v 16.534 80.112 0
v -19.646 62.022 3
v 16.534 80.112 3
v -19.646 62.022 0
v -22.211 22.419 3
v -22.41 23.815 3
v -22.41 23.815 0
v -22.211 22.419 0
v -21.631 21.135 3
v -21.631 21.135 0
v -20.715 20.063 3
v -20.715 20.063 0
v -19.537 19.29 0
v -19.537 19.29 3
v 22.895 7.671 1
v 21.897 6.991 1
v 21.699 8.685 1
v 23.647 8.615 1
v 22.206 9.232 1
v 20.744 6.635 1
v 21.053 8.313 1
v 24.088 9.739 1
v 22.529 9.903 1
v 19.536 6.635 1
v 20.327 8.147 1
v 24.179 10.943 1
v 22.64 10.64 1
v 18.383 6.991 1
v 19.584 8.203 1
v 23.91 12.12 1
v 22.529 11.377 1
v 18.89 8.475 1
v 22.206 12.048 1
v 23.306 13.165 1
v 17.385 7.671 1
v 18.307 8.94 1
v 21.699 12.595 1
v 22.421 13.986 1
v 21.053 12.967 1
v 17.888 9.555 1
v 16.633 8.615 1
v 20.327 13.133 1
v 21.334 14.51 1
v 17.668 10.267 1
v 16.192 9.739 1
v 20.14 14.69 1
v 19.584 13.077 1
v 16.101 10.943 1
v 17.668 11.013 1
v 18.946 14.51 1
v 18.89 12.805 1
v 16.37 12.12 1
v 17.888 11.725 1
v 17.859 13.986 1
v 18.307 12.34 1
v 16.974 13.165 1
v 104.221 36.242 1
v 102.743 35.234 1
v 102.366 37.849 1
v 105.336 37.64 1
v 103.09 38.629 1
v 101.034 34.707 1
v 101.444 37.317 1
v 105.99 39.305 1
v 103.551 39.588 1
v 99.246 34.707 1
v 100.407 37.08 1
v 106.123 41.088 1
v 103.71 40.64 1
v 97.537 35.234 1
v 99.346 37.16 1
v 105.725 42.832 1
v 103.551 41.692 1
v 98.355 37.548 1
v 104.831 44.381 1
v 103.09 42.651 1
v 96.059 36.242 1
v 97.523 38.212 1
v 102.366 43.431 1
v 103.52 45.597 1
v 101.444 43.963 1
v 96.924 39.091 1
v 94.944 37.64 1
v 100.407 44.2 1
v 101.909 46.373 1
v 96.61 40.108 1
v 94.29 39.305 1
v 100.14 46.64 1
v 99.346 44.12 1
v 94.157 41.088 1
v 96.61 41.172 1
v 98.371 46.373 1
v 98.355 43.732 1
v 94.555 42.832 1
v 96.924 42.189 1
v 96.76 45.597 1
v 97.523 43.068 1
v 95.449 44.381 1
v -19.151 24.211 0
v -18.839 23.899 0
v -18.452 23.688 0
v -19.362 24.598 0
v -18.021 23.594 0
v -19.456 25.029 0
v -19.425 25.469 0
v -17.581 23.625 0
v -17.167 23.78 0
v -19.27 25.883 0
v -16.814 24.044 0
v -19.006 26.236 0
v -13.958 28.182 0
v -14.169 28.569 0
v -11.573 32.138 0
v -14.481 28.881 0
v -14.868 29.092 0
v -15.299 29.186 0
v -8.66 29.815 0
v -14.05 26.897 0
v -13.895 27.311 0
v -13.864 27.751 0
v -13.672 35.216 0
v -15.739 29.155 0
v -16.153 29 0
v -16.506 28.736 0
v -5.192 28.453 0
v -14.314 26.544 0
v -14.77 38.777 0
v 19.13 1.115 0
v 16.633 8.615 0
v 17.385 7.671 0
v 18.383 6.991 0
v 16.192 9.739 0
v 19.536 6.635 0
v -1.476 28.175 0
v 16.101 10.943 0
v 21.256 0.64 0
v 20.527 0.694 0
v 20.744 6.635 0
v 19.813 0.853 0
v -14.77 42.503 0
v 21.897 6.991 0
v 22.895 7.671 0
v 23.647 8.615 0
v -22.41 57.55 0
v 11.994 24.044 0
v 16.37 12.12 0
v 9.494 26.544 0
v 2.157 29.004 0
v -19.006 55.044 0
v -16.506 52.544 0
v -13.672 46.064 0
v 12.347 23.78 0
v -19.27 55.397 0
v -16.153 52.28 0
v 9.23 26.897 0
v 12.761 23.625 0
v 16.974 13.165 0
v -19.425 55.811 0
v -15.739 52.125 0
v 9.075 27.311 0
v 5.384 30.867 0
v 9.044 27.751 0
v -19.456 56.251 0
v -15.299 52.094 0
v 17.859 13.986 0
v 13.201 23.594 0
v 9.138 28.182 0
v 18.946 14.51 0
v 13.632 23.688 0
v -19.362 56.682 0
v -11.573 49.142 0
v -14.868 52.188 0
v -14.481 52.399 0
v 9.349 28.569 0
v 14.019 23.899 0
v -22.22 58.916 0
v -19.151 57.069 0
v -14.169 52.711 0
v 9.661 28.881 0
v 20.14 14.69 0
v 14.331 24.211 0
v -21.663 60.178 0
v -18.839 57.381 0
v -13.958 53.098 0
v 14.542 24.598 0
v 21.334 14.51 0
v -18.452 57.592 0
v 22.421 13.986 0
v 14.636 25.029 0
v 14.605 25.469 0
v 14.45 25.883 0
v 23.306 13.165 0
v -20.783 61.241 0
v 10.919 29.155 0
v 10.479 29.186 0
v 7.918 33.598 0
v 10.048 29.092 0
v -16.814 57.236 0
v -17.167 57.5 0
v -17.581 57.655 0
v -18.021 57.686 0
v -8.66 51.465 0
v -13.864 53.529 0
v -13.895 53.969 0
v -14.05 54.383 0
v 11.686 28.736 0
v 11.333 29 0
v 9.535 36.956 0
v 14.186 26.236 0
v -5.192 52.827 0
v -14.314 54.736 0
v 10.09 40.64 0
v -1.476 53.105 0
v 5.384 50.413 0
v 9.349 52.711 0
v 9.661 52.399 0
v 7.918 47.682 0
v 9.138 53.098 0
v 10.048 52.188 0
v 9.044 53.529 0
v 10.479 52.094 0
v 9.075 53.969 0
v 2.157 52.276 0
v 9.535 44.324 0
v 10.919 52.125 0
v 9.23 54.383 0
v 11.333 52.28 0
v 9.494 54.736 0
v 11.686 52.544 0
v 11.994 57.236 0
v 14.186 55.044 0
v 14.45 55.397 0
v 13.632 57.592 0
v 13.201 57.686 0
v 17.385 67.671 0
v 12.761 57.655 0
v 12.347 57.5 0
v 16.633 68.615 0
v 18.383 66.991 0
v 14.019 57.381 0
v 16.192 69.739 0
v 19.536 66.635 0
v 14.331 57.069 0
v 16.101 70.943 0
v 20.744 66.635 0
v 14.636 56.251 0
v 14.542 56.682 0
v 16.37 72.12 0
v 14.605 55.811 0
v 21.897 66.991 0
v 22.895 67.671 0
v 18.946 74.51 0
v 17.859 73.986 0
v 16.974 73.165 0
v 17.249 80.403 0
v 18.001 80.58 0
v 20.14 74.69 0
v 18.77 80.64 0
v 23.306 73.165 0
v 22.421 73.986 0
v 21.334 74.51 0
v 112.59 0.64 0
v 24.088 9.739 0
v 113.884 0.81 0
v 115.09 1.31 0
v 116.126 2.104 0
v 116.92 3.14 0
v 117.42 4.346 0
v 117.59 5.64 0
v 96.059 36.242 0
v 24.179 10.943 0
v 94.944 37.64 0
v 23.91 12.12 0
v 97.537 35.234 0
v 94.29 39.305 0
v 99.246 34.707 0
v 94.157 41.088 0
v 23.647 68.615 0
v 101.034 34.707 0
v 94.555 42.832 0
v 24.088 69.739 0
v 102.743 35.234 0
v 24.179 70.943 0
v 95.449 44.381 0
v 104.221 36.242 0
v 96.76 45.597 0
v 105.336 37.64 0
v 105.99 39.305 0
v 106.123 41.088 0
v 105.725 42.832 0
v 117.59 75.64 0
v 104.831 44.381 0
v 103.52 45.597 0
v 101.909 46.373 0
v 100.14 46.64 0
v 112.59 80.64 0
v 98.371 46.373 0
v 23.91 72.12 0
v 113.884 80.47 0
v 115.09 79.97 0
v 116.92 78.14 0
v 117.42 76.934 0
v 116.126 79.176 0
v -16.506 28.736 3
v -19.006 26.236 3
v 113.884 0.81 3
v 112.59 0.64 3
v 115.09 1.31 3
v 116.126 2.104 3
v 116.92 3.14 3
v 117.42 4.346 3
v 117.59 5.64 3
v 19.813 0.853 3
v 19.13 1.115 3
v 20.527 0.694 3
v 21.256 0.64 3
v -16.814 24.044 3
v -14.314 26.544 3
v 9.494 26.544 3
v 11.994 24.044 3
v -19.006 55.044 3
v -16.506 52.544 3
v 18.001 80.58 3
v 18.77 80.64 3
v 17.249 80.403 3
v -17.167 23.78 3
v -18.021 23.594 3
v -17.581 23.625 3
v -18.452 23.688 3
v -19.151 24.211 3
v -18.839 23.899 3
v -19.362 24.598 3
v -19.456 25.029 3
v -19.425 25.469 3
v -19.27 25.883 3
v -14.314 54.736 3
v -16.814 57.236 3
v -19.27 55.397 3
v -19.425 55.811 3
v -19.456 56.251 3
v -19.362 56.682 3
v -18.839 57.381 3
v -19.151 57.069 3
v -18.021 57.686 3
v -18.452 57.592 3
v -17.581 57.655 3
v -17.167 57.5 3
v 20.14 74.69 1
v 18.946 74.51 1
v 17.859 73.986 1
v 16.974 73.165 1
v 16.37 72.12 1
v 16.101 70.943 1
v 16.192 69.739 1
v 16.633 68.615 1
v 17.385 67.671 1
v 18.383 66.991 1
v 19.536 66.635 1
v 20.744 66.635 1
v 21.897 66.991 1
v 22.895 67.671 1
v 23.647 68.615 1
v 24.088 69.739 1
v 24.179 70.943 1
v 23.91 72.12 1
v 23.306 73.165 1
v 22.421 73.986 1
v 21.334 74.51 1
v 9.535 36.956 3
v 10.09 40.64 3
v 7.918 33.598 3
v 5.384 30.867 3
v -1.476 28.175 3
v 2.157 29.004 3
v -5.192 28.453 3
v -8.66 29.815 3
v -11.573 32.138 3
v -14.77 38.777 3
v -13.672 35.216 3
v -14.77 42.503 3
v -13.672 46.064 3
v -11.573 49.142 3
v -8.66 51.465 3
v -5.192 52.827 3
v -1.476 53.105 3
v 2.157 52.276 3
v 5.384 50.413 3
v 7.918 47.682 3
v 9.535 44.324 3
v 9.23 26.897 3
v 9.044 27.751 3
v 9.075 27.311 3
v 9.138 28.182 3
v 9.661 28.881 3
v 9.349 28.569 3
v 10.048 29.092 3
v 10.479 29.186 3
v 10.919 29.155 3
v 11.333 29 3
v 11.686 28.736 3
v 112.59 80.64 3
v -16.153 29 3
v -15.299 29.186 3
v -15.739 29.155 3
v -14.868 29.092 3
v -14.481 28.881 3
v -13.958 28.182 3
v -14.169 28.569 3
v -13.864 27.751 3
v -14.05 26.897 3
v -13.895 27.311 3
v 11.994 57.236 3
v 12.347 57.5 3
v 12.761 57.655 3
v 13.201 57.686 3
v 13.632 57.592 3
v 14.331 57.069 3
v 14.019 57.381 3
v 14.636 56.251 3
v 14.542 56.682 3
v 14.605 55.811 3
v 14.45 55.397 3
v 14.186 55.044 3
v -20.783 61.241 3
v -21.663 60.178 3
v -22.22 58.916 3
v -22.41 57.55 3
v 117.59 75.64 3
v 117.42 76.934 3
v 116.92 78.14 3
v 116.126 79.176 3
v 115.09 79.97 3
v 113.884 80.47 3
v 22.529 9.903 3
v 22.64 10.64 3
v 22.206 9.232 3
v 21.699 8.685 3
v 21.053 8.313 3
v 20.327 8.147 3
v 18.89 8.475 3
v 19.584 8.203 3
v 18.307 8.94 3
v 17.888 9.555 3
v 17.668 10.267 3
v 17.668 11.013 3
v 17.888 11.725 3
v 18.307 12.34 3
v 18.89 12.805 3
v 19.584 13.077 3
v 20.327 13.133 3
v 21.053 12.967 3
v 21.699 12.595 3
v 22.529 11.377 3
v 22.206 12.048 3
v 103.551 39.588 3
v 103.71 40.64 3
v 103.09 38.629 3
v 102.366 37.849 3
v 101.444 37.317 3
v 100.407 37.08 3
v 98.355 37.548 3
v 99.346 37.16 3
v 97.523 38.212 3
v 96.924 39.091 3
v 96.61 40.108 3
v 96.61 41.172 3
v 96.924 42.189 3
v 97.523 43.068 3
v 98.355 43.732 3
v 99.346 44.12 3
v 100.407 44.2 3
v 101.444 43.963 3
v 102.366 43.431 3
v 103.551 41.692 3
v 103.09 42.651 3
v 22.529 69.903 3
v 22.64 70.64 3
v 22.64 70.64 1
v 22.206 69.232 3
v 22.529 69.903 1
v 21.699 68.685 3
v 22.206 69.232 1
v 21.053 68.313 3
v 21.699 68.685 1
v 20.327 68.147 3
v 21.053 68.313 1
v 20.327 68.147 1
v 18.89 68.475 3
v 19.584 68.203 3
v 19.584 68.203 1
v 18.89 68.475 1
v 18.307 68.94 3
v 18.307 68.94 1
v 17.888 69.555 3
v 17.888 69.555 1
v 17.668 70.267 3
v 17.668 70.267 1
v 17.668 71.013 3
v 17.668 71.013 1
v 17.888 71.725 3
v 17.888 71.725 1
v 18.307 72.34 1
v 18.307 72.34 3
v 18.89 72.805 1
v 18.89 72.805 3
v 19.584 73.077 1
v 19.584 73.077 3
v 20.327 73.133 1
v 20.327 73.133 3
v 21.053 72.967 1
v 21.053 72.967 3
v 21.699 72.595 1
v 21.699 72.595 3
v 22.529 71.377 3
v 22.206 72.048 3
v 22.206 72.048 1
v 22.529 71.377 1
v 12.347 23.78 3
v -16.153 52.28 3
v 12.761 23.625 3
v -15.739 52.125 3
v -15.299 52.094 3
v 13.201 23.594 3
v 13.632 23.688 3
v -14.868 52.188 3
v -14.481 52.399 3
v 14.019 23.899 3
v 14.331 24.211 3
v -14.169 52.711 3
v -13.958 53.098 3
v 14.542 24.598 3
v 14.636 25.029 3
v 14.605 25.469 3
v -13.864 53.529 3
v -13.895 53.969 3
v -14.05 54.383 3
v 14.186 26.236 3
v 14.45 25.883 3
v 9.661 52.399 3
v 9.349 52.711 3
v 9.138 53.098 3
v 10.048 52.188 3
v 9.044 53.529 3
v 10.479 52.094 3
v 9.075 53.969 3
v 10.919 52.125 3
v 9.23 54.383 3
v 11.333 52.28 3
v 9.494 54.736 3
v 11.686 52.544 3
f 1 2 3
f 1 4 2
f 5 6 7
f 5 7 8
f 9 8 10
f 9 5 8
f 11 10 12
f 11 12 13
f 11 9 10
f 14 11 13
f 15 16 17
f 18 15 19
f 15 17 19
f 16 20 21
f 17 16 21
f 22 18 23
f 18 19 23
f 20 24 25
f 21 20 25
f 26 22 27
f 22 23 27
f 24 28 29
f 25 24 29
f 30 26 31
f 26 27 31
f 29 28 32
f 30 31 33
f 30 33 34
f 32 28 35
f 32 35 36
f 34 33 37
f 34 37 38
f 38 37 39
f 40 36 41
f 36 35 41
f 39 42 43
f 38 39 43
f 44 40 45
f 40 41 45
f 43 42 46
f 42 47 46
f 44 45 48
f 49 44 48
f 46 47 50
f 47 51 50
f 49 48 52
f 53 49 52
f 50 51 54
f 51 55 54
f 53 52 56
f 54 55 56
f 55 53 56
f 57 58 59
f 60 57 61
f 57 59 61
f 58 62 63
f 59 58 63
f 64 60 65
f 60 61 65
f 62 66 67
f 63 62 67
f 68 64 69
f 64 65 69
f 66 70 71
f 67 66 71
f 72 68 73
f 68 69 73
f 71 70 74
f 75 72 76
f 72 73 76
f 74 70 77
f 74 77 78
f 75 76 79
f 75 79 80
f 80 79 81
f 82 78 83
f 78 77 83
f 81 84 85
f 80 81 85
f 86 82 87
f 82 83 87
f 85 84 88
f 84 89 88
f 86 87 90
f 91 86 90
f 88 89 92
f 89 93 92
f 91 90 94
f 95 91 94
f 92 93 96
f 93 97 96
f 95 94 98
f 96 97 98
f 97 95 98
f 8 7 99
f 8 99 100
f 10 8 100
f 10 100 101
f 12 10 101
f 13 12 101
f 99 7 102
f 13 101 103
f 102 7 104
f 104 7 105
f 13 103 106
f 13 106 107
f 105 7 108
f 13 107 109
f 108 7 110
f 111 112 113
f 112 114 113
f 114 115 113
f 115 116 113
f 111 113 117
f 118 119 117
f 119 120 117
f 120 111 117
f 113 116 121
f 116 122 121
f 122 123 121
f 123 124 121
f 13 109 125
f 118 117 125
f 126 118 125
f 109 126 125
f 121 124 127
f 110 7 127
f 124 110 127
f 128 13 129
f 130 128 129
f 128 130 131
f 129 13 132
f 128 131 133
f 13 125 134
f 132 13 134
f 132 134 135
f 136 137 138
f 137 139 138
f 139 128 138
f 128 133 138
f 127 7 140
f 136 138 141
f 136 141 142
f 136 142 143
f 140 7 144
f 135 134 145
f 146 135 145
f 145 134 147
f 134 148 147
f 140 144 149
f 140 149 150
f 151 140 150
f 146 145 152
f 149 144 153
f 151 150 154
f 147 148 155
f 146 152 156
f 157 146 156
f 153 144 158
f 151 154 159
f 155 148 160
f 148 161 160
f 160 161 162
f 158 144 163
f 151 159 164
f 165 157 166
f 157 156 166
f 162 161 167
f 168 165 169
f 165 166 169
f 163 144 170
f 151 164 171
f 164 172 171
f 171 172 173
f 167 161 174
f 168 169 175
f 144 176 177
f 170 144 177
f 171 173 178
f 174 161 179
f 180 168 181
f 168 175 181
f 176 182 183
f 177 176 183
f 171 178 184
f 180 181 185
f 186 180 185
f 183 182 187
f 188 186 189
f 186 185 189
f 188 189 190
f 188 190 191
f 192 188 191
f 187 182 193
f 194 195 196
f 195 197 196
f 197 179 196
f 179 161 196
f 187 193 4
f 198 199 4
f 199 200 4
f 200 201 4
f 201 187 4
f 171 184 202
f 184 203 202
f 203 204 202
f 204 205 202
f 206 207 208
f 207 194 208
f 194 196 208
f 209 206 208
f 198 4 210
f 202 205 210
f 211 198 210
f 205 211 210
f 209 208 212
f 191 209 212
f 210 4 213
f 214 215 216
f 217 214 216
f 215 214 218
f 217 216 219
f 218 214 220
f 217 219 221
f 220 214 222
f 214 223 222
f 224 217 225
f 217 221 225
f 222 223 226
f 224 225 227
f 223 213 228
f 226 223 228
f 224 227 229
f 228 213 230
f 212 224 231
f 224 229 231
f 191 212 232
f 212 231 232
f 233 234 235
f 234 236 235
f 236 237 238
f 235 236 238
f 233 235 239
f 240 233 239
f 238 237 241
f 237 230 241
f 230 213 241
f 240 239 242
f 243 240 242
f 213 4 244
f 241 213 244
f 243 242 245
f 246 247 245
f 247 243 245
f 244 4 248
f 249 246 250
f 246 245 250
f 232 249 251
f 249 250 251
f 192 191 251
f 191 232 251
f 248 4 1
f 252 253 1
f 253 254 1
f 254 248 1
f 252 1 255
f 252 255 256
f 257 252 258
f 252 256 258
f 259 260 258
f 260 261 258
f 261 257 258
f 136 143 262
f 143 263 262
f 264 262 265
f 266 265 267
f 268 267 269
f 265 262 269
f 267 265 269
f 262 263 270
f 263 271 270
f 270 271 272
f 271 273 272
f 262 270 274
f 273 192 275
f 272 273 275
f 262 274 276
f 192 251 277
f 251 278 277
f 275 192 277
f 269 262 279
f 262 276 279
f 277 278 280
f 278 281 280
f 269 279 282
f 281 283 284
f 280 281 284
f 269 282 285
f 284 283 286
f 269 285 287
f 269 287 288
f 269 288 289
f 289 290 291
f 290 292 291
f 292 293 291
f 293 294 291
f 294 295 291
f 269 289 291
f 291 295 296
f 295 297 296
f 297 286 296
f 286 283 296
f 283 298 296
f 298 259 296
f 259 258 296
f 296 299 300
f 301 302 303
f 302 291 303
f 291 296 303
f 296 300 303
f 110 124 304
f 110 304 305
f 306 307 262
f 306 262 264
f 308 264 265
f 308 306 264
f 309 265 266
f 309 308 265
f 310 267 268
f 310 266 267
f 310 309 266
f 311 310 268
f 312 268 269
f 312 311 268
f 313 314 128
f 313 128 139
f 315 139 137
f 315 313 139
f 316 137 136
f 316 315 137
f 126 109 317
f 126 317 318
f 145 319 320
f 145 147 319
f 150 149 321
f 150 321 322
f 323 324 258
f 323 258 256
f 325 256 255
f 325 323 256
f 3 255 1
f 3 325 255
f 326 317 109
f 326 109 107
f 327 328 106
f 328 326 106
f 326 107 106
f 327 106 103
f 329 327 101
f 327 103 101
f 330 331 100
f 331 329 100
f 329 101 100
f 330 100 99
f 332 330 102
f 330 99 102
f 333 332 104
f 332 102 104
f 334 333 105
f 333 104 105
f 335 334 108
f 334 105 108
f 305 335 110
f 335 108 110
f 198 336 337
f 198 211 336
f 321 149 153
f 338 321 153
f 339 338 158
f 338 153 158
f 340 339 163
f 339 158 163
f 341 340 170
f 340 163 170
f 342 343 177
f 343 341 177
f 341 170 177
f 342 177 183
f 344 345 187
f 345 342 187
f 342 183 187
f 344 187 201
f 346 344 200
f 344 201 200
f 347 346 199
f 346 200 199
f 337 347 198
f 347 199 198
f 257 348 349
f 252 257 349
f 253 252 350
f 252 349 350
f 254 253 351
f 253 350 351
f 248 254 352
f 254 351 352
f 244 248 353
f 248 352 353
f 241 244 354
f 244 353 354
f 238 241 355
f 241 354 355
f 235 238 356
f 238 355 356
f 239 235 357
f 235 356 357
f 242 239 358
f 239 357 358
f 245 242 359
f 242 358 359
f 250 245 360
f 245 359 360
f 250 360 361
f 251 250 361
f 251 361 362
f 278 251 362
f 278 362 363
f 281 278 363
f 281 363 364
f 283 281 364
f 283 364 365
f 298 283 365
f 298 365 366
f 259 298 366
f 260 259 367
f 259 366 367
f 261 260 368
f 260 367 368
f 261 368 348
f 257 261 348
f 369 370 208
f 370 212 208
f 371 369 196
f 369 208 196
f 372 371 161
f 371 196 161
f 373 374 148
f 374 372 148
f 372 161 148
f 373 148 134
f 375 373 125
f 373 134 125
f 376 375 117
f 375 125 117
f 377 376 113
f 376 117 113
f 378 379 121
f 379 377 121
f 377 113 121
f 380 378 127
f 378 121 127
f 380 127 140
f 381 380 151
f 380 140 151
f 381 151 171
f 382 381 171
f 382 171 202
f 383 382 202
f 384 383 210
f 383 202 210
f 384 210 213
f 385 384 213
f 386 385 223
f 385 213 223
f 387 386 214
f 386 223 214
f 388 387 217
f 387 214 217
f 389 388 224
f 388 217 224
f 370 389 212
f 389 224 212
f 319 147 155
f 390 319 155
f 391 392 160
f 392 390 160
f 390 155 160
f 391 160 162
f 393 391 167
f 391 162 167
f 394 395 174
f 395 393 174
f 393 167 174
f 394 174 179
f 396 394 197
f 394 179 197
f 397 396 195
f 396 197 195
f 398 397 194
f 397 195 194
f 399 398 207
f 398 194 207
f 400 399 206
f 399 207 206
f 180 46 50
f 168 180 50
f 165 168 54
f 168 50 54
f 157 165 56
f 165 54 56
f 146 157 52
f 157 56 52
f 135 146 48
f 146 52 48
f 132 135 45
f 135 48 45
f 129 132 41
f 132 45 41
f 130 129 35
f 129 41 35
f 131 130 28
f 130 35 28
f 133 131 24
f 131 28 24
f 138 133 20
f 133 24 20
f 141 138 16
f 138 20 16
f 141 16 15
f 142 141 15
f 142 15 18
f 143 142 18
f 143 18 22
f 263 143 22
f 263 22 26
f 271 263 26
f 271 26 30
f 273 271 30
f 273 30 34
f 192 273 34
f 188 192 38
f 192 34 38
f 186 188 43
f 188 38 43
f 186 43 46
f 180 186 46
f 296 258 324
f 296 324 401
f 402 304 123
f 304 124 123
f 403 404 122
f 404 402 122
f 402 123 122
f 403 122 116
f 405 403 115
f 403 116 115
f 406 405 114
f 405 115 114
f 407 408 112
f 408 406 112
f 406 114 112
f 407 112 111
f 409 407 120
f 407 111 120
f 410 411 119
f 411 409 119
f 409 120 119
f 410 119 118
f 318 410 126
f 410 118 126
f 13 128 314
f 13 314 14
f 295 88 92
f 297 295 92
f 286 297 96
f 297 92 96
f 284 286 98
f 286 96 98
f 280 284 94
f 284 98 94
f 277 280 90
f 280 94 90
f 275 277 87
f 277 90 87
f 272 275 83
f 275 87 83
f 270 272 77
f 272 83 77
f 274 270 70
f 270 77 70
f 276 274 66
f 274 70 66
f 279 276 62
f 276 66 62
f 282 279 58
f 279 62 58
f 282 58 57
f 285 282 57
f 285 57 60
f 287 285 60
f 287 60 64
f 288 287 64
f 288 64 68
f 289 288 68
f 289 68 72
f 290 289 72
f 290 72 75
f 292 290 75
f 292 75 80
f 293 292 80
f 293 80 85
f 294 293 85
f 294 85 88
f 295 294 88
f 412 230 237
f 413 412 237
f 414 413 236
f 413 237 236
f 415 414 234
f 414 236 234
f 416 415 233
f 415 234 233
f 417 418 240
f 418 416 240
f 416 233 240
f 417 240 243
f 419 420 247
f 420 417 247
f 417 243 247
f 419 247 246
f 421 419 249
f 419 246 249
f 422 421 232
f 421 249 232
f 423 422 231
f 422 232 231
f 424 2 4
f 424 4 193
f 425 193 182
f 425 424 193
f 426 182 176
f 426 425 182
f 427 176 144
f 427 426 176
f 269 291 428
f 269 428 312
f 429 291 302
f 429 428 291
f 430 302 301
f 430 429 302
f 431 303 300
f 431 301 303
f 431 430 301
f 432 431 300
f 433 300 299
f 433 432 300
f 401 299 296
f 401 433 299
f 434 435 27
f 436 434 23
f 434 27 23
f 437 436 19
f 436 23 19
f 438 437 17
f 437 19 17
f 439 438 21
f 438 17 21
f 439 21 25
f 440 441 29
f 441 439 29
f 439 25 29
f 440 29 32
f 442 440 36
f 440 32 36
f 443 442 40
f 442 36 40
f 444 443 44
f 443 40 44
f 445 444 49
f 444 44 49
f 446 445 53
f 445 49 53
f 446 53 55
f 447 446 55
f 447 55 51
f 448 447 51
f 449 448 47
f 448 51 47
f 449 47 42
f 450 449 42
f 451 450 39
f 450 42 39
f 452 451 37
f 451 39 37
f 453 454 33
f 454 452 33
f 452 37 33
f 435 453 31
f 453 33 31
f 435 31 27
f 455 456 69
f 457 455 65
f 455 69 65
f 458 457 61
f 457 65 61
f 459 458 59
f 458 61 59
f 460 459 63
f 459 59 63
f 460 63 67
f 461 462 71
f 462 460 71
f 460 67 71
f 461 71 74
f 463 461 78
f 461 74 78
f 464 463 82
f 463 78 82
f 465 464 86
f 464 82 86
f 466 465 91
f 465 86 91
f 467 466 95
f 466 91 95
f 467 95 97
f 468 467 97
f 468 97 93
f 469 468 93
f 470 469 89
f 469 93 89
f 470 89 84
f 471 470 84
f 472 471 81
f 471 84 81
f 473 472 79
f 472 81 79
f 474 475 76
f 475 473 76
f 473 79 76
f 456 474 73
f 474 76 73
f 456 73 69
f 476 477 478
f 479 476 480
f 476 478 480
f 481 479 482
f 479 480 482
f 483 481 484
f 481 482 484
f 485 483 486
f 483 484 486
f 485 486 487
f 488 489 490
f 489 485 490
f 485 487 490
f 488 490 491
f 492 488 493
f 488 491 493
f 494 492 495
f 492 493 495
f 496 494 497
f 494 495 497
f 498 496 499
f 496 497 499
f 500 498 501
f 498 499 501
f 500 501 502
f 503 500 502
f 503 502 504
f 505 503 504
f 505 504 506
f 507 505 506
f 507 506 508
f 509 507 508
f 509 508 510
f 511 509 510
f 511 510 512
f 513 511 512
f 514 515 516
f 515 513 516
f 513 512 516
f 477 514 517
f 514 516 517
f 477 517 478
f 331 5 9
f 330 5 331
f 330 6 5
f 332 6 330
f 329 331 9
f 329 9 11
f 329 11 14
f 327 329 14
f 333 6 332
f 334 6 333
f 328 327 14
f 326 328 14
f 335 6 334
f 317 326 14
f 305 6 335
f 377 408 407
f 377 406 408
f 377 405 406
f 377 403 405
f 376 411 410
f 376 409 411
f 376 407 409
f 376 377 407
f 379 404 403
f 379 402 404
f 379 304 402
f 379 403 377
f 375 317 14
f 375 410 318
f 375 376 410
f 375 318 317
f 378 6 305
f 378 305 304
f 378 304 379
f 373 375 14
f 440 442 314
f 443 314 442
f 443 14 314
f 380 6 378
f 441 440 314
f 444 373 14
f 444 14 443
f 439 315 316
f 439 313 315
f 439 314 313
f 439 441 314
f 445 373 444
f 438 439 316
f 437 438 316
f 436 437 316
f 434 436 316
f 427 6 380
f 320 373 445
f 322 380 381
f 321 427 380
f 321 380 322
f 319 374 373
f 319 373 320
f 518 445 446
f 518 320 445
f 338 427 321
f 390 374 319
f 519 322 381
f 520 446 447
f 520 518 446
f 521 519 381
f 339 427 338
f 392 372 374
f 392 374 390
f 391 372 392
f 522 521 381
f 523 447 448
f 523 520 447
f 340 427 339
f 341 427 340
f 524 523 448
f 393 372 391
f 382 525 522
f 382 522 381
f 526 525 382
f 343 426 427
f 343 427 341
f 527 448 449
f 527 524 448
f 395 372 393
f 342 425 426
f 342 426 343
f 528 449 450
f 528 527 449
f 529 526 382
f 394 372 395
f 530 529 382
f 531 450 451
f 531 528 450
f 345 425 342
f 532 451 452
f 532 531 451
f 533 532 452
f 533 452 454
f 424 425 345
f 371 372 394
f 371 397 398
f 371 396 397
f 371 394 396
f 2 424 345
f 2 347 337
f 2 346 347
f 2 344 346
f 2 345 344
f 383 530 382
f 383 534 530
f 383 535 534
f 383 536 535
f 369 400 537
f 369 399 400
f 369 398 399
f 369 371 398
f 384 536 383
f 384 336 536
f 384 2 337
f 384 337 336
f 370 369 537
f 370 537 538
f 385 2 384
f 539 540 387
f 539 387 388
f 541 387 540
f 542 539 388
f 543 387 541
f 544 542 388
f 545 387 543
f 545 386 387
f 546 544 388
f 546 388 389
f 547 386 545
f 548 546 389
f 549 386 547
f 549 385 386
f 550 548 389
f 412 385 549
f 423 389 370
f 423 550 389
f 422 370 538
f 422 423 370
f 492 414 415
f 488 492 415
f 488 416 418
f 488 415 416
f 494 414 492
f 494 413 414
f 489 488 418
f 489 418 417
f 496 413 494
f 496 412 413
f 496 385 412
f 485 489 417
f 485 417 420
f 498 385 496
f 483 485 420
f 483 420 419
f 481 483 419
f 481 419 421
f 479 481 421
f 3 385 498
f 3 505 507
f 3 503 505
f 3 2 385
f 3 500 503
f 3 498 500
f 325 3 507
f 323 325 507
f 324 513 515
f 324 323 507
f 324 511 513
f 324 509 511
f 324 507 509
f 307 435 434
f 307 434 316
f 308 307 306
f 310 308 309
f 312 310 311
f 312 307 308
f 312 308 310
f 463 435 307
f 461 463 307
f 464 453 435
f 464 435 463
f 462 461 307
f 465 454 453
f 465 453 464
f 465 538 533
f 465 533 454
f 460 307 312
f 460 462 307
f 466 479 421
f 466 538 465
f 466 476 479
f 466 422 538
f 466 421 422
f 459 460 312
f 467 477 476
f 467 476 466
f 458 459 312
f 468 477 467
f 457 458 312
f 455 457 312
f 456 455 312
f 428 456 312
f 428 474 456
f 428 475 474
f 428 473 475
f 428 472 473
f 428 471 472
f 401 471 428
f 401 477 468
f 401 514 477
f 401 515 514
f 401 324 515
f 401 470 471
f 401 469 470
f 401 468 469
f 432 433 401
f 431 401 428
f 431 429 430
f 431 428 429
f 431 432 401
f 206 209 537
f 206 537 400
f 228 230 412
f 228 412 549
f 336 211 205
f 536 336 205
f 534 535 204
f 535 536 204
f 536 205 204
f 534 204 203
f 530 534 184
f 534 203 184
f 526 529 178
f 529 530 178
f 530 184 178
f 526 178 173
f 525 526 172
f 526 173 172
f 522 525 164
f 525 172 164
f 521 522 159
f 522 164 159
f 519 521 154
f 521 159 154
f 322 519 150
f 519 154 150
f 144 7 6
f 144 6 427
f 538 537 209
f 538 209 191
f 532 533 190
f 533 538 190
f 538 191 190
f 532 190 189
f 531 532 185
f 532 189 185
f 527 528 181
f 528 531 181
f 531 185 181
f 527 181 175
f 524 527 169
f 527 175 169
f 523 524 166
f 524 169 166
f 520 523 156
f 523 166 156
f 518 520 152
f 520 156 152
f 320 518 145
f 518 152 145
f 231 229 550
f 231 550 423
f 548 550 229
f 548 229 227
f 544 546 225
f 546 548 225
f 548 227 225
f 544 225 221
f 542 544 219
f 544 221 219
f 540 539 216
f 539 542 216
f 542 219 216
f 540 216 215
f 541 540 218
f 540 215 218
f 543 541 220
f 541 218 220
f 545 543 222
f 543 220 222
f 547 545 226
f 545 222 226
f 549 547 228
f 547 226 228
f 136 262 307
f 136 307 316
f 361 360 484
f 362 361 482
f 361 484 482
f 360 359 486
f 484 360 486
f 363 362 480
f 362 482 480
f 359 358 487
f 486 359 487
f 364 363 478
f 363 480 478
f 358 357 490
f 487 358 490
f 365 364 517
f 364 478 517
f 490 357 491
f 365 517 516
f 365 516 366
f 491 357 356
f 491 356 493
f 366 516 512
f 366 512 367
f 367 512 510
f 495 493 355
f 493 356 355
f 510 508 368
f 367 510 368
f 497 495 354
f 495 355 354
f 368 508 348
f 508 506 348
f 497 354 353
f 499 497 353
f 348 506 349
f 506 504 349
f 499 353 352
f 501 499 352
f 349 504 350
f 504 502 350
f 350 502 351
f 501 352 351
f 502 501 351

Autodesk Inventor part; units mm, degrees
ref_plane "YZ Plane" through (0, 0, 0) normal (1, 0, 0) x (0, 1, 0)
ref_plane "XZ Plane" through (0, 0, 0) normal (0, 1, 0) x (-1, 0, 0)
ref_plane "XY Plane" through (0, 0, 0) normal (0, 0, 1) x (1, 0, 0)
sketch "Sketch1" plane through (0, 0, 0) normal (0, 0, 1) x (1, 0, 0)
  circle A0 centre (-2.41, 40.64) radius 12.5 projected
  line L0 (-16.506, 28.736) -> (-19.006, 26.236) projected
  arc A1 (-14.314, 26.544) -> (-16.506, 28.736) centre (-15.41, 27.64) ccw projected
  line L1 (-16.814, 24.044) -> (-14.314, 26.544) projected
  arc A2 (-19.006, 26.236) -> (-16.814, 24.044) centre (-17.91, 25.14) ccw projected
  line L2 (-19.006, 55.044) -> (-16.506, 52.544) projected
  arc A3 (-16.506, 52.544) -> (-14.314, 54.736) centre (-15.41, 53.64) ccw projected
  line L3 (-14.314, 54.736) -> (-16.814, 57.236) projected
  arc A4 (-16.814, 57.236) -> (-19.006, 55.044) centre (-17.91, 56.14) ccw projected
  line L4 (9.494, 26.544) -> (11.994, 24.044) projected
  arc A5 (11.686, 28.736) -> (9.494, 26.544) centre (10.59, 27.64) ccw projected
  line L5 (14.186, 26.236) -> (11.686, 28.736) projected
  arc A6 (11.994, 24.044) -> (14.186, 26.236) centre (13.09, 25.14) ccw projected
  line L6 (11.686, 52.544) -> (14.186, 55.044) projected
  arc A7 (9.494, 54.736) -> (11.686, 52.544) centre (10.59, 53.64) ccw projected
  line L7 (11.994, 57.236) -> (9.494, 54.736) projected
  arc A8 (14.186, 55.044) -> (11.994, 57.236) centre (13.09, 56.14) ccw projected
  circle A9 centre (20.14, 70.64) radius 2.5 projected
  circle A10 centre (20.14, 10.64) radius 2.5 projected
  circle A11 centre (100.14, 40.64) radius 3.57 projected
  line L8 (-22.41, 20.64) -> (-22.41, 60.64)
  line L9 (-22.41, 60.64) -> (17.59, 80.64)
  line L10 (17.59, 80.64) -> (117.59, 80.64)
  line L11 (117.59, 80.64) -> (117.59, 0.64)
  line L12 (117.59, 0.64) -> (20.14, 0.64)
  line L13 (20.14, 0.64) -> (-22.41, 20.64)
  point P0 (0, 0)
  dimension "d0" = 20
  dimension "d1" = 0
  dimension "d2" = 80
  dimension "d3" = 90
  dimension "d4" = 90
  dimension "d5" = 10
  dimension "d6" = 100
  dimension "d7" = 140
  dimension "d8" = 40
  dimension "d9" = 20
extrude "Extrusion1" add sketch "Sketch1" along normal blind 3
fillet "Fillet1" radius 5 6 edges at (117.59, 80.64, 1.5) (117.59, 0.64, 1.5) (17.59, 80.64, 1.5) (-22.41, 60.64, 1.5) (-22.41, 20.64, 1.5) (20.14, 0.64, 1.5)
sketch "Sketch2" plane through (0, 0, 0) normal (0, 0, -1) x (-1, 0, 0)
  circle A0 centre (2.41, 40.64) radius 12.5 projected
  circle A1 centre (-100.14, 40.64) radius 3.57 projected
  circle A2 centre (-20.14, 10.64) radius 2.5 projected
  circle A3 centre (-20.14, 70.64) radius 2.5 projected
  arc A4 (-11.686, 52.544) -> (-9.494, 54.736) centre (-10.59, 53.64) ccw projected
  line L0 (-11.686, 52.544) -> (-14.186, 55.044) projected
  arc A5 (-11.994, 57.236) -> (-14.186, 55.044) centre (-13.09, 56.14) ccw projected
  line L1 (-11.994, 57.236) -> (-9.494, 54.736) projected
  arc A6 (-9.494, 26.544) -> (-11.686, 28.736) centre (-10.59, 27.64) ccw projected
  line L2 (-9.494, 26.544) -> (-11.994, 24.044) projected
  arc A7 (-14.186, 26.236) -> (-11.994, 24.044) centre (-13.09, 25.14) ccw projected
  line L3 (-14.186, 26.236) -> (-11.686, 28.736) projected
  arc A8 (19.006, 55.044) -> (16.814, 57.236) centre (17.91, 56.14) ccw projected
  line L4 (19.006, 55.044) -> (16.506, 52.544) projected
  arc A9 (14.314, 54.736) -> (16.506, 52.544) centre (15.41, 53.64) ccw projected
  line L5 (14.314, 54.736) -> (16.814, 57.236) projected
  arc A10 (16.506, 28.736) -> (14.314, 26.544) centre (15.41, 27.64) ccw projected
  line L6 (16.506, 28.736) -> (19.006, 26.236) projected
  arc A11 (16.814, 24.044) -> (19.006, 26.236) centre (17.91, 25.14) ccw projected
  line L7 (16.814, 24.044) -> (14.314, 26.544) projected
  arc A12 (-21.2565, 0.64) -> (-19.1296, 1.1149) centre (-21.2565, 5.64) ccw projected
  line L8 (-19.1296, 1.1149) -> (19.5369, 19.2896) projected
  arc A13 (19.5369, 19.2896) -> (22.41, 23.8146) centre (17.41, 23.8146) ccw projected
  line L9 (22.41, 23.8146) -> (22.41, 57.5498) projected
  arc A14 (22.41, 57.5498) -> (19.6461, 62.022) centre (17.41, 57.5498) ccw projected
  line L10 (19.6461, 62.022) -> (-16.5343, 80.1121) projected
  arc A15 (-16.5343, 80.1121) -> (-18.7703, 80.64) centre (-18.7703, 75.64) ccw projected
  line L11 (-18.7703, 80.64) -> (-112.59, 80.64) projected
  arc A16 (-112.59, 80.64) -> (-117.59, 75.64) centre (-112.59, 75.64) ccw projected
  line L12 (-117.59, 75.64) -> (-117.59, 5.64) projected
  arc A17 (-117.59, 5.64) -> (-112.59, 0.64) centre (-112.59, 5.64) ccw projected
  line L13 (-112.59, 0.64) -> (-21.2565, 0.64) projected
  point P0 (0, 0)
hole "Hole1" at (100.14, 40.64, 0) direction (0, 0, 1) diameter 12 depth 1
sketch "Sketch3" plane through (0, 0, 0) normal (0, 0, -1) x (-1, 0, 0)
  circle A0 centre (-20.14, 10.64) radius 2.5 projected
  circle A1 centre (-100.14, 40.64) radius 6 projected
  circle A2 centre (2.41, 40.64) radius 12.5 projected
  circle A3 centre (-20.14, 10.64) radius 2.5 projected
  circle A4 centre (-20.14, 70.64) radius 2.5 projected
  arc A5 (-11.686, 52.544) -> (-9.494, 54.736) centre (-10.59, 53.64) ccw projected
  line L0 (-11.686, 52.544) -> (-14.186, 55.044) projected
  arc A6 (-11.994, 57.236) -> (-14.186, 55.044) centre (-13.09, 56.14) ccw projected
  line L1 (-11.994, 57.236) -> (-9.494, 54.736) projected
  arc A7 (-9.494, 26.544) -> (-11.686, 28.736) centre (-10.59, 27.64) ccw projected
  line L2 (-9.494, 26.544) -> (-11.994, 24.044) projected
  arc A8 (-14.186, 26.236) -> (-11.994, 24.044) centre (-13.09, 25.14) ccw projected
  line L3 (-14.186, 26.236) -> (-11.686, 28.736) projected
  arc A9 (19.006, 55.044) -> (16.814, 57.236) centre (17.91, 56.14) ccw projected
  line L4 (19.006, 55.044) -> (16.506, 52.544) projected
  arc A10 (14.314, 54.736) -> (16.506, 52.544) centre (15.41, 53.64) ccw projected
  line L5 (14.314, 54.736) -> (16.814, 57.236) projected
  arc A11 (16.506, 28.736) -> (14.314, 26.544) centre (15.41, 27.64) ccw projected
  line L6 (16.506, 28.736) -> (19.006, 26.236) projected
  arc A12 (16.814, 24.044) -> (19.006, 26.236) centre (17.91, 25.14) ccw projected
  line L7 (16.814, 24.044) -> (14.314, 26.544) projected
  arc A13 (-21.2565, 0.64) -> (-19.1296, 1.1149) centre (-21.2565, 5.64) ccw projected
  line L8 (-19.1296, 1.1149) -> (19.5369, 19.2896) projected
  arc A14 (19.5369, 19.2896) -> (22.41, 23.8146) centre (17.41, 23.8146) ccw projected
  line L9 (22.41, 23.8146) -> (22.41, 57.5498) projected
  arc A15 (22.41, 57.5498) -> (19.6461, 62.022) centre (17.41, 57.5498) ccw projected
  line L10 (19.6461, 62.022) -> (-16.5343, 80.1121) projected
  arc A16 (-16.5343, 80.1121) -> (-18.7703, 80.64) centre (-18.7703, 75.64) ccw projected
  line L11 (-18.7703, 80.64) -> (-112.59, 80.64) projected
  arc A17 (-112.59, 80.64) -> (-117.59, 75.64) centre (-112.59, 75.64) ccw projected
  line L12 (-117.59, 75.64) -> (-117.59, 5.64) projected
  arc A18 (-117.59, 5.64) -> (-112.59, 0.64) centre (-112.59, 5.64) ccw projected
  line L13 (-112.59, 0.64) -> (-21.2565, 0.64) projected
  circle A19 centre (-20.14, 70.64) radius 2.0572 projected
  circle A20 centre (-20.14, 10.64) radius 2.0572 projected
  point P0 (0, 0)
hole "Hole2" at (20.14, 10.64, 0) at (20.14, 70.64, 0) direction (0, 0, 1) diameter 8.1 depth 1
properties part number "Y Slider" material "Aluminum 6061"
